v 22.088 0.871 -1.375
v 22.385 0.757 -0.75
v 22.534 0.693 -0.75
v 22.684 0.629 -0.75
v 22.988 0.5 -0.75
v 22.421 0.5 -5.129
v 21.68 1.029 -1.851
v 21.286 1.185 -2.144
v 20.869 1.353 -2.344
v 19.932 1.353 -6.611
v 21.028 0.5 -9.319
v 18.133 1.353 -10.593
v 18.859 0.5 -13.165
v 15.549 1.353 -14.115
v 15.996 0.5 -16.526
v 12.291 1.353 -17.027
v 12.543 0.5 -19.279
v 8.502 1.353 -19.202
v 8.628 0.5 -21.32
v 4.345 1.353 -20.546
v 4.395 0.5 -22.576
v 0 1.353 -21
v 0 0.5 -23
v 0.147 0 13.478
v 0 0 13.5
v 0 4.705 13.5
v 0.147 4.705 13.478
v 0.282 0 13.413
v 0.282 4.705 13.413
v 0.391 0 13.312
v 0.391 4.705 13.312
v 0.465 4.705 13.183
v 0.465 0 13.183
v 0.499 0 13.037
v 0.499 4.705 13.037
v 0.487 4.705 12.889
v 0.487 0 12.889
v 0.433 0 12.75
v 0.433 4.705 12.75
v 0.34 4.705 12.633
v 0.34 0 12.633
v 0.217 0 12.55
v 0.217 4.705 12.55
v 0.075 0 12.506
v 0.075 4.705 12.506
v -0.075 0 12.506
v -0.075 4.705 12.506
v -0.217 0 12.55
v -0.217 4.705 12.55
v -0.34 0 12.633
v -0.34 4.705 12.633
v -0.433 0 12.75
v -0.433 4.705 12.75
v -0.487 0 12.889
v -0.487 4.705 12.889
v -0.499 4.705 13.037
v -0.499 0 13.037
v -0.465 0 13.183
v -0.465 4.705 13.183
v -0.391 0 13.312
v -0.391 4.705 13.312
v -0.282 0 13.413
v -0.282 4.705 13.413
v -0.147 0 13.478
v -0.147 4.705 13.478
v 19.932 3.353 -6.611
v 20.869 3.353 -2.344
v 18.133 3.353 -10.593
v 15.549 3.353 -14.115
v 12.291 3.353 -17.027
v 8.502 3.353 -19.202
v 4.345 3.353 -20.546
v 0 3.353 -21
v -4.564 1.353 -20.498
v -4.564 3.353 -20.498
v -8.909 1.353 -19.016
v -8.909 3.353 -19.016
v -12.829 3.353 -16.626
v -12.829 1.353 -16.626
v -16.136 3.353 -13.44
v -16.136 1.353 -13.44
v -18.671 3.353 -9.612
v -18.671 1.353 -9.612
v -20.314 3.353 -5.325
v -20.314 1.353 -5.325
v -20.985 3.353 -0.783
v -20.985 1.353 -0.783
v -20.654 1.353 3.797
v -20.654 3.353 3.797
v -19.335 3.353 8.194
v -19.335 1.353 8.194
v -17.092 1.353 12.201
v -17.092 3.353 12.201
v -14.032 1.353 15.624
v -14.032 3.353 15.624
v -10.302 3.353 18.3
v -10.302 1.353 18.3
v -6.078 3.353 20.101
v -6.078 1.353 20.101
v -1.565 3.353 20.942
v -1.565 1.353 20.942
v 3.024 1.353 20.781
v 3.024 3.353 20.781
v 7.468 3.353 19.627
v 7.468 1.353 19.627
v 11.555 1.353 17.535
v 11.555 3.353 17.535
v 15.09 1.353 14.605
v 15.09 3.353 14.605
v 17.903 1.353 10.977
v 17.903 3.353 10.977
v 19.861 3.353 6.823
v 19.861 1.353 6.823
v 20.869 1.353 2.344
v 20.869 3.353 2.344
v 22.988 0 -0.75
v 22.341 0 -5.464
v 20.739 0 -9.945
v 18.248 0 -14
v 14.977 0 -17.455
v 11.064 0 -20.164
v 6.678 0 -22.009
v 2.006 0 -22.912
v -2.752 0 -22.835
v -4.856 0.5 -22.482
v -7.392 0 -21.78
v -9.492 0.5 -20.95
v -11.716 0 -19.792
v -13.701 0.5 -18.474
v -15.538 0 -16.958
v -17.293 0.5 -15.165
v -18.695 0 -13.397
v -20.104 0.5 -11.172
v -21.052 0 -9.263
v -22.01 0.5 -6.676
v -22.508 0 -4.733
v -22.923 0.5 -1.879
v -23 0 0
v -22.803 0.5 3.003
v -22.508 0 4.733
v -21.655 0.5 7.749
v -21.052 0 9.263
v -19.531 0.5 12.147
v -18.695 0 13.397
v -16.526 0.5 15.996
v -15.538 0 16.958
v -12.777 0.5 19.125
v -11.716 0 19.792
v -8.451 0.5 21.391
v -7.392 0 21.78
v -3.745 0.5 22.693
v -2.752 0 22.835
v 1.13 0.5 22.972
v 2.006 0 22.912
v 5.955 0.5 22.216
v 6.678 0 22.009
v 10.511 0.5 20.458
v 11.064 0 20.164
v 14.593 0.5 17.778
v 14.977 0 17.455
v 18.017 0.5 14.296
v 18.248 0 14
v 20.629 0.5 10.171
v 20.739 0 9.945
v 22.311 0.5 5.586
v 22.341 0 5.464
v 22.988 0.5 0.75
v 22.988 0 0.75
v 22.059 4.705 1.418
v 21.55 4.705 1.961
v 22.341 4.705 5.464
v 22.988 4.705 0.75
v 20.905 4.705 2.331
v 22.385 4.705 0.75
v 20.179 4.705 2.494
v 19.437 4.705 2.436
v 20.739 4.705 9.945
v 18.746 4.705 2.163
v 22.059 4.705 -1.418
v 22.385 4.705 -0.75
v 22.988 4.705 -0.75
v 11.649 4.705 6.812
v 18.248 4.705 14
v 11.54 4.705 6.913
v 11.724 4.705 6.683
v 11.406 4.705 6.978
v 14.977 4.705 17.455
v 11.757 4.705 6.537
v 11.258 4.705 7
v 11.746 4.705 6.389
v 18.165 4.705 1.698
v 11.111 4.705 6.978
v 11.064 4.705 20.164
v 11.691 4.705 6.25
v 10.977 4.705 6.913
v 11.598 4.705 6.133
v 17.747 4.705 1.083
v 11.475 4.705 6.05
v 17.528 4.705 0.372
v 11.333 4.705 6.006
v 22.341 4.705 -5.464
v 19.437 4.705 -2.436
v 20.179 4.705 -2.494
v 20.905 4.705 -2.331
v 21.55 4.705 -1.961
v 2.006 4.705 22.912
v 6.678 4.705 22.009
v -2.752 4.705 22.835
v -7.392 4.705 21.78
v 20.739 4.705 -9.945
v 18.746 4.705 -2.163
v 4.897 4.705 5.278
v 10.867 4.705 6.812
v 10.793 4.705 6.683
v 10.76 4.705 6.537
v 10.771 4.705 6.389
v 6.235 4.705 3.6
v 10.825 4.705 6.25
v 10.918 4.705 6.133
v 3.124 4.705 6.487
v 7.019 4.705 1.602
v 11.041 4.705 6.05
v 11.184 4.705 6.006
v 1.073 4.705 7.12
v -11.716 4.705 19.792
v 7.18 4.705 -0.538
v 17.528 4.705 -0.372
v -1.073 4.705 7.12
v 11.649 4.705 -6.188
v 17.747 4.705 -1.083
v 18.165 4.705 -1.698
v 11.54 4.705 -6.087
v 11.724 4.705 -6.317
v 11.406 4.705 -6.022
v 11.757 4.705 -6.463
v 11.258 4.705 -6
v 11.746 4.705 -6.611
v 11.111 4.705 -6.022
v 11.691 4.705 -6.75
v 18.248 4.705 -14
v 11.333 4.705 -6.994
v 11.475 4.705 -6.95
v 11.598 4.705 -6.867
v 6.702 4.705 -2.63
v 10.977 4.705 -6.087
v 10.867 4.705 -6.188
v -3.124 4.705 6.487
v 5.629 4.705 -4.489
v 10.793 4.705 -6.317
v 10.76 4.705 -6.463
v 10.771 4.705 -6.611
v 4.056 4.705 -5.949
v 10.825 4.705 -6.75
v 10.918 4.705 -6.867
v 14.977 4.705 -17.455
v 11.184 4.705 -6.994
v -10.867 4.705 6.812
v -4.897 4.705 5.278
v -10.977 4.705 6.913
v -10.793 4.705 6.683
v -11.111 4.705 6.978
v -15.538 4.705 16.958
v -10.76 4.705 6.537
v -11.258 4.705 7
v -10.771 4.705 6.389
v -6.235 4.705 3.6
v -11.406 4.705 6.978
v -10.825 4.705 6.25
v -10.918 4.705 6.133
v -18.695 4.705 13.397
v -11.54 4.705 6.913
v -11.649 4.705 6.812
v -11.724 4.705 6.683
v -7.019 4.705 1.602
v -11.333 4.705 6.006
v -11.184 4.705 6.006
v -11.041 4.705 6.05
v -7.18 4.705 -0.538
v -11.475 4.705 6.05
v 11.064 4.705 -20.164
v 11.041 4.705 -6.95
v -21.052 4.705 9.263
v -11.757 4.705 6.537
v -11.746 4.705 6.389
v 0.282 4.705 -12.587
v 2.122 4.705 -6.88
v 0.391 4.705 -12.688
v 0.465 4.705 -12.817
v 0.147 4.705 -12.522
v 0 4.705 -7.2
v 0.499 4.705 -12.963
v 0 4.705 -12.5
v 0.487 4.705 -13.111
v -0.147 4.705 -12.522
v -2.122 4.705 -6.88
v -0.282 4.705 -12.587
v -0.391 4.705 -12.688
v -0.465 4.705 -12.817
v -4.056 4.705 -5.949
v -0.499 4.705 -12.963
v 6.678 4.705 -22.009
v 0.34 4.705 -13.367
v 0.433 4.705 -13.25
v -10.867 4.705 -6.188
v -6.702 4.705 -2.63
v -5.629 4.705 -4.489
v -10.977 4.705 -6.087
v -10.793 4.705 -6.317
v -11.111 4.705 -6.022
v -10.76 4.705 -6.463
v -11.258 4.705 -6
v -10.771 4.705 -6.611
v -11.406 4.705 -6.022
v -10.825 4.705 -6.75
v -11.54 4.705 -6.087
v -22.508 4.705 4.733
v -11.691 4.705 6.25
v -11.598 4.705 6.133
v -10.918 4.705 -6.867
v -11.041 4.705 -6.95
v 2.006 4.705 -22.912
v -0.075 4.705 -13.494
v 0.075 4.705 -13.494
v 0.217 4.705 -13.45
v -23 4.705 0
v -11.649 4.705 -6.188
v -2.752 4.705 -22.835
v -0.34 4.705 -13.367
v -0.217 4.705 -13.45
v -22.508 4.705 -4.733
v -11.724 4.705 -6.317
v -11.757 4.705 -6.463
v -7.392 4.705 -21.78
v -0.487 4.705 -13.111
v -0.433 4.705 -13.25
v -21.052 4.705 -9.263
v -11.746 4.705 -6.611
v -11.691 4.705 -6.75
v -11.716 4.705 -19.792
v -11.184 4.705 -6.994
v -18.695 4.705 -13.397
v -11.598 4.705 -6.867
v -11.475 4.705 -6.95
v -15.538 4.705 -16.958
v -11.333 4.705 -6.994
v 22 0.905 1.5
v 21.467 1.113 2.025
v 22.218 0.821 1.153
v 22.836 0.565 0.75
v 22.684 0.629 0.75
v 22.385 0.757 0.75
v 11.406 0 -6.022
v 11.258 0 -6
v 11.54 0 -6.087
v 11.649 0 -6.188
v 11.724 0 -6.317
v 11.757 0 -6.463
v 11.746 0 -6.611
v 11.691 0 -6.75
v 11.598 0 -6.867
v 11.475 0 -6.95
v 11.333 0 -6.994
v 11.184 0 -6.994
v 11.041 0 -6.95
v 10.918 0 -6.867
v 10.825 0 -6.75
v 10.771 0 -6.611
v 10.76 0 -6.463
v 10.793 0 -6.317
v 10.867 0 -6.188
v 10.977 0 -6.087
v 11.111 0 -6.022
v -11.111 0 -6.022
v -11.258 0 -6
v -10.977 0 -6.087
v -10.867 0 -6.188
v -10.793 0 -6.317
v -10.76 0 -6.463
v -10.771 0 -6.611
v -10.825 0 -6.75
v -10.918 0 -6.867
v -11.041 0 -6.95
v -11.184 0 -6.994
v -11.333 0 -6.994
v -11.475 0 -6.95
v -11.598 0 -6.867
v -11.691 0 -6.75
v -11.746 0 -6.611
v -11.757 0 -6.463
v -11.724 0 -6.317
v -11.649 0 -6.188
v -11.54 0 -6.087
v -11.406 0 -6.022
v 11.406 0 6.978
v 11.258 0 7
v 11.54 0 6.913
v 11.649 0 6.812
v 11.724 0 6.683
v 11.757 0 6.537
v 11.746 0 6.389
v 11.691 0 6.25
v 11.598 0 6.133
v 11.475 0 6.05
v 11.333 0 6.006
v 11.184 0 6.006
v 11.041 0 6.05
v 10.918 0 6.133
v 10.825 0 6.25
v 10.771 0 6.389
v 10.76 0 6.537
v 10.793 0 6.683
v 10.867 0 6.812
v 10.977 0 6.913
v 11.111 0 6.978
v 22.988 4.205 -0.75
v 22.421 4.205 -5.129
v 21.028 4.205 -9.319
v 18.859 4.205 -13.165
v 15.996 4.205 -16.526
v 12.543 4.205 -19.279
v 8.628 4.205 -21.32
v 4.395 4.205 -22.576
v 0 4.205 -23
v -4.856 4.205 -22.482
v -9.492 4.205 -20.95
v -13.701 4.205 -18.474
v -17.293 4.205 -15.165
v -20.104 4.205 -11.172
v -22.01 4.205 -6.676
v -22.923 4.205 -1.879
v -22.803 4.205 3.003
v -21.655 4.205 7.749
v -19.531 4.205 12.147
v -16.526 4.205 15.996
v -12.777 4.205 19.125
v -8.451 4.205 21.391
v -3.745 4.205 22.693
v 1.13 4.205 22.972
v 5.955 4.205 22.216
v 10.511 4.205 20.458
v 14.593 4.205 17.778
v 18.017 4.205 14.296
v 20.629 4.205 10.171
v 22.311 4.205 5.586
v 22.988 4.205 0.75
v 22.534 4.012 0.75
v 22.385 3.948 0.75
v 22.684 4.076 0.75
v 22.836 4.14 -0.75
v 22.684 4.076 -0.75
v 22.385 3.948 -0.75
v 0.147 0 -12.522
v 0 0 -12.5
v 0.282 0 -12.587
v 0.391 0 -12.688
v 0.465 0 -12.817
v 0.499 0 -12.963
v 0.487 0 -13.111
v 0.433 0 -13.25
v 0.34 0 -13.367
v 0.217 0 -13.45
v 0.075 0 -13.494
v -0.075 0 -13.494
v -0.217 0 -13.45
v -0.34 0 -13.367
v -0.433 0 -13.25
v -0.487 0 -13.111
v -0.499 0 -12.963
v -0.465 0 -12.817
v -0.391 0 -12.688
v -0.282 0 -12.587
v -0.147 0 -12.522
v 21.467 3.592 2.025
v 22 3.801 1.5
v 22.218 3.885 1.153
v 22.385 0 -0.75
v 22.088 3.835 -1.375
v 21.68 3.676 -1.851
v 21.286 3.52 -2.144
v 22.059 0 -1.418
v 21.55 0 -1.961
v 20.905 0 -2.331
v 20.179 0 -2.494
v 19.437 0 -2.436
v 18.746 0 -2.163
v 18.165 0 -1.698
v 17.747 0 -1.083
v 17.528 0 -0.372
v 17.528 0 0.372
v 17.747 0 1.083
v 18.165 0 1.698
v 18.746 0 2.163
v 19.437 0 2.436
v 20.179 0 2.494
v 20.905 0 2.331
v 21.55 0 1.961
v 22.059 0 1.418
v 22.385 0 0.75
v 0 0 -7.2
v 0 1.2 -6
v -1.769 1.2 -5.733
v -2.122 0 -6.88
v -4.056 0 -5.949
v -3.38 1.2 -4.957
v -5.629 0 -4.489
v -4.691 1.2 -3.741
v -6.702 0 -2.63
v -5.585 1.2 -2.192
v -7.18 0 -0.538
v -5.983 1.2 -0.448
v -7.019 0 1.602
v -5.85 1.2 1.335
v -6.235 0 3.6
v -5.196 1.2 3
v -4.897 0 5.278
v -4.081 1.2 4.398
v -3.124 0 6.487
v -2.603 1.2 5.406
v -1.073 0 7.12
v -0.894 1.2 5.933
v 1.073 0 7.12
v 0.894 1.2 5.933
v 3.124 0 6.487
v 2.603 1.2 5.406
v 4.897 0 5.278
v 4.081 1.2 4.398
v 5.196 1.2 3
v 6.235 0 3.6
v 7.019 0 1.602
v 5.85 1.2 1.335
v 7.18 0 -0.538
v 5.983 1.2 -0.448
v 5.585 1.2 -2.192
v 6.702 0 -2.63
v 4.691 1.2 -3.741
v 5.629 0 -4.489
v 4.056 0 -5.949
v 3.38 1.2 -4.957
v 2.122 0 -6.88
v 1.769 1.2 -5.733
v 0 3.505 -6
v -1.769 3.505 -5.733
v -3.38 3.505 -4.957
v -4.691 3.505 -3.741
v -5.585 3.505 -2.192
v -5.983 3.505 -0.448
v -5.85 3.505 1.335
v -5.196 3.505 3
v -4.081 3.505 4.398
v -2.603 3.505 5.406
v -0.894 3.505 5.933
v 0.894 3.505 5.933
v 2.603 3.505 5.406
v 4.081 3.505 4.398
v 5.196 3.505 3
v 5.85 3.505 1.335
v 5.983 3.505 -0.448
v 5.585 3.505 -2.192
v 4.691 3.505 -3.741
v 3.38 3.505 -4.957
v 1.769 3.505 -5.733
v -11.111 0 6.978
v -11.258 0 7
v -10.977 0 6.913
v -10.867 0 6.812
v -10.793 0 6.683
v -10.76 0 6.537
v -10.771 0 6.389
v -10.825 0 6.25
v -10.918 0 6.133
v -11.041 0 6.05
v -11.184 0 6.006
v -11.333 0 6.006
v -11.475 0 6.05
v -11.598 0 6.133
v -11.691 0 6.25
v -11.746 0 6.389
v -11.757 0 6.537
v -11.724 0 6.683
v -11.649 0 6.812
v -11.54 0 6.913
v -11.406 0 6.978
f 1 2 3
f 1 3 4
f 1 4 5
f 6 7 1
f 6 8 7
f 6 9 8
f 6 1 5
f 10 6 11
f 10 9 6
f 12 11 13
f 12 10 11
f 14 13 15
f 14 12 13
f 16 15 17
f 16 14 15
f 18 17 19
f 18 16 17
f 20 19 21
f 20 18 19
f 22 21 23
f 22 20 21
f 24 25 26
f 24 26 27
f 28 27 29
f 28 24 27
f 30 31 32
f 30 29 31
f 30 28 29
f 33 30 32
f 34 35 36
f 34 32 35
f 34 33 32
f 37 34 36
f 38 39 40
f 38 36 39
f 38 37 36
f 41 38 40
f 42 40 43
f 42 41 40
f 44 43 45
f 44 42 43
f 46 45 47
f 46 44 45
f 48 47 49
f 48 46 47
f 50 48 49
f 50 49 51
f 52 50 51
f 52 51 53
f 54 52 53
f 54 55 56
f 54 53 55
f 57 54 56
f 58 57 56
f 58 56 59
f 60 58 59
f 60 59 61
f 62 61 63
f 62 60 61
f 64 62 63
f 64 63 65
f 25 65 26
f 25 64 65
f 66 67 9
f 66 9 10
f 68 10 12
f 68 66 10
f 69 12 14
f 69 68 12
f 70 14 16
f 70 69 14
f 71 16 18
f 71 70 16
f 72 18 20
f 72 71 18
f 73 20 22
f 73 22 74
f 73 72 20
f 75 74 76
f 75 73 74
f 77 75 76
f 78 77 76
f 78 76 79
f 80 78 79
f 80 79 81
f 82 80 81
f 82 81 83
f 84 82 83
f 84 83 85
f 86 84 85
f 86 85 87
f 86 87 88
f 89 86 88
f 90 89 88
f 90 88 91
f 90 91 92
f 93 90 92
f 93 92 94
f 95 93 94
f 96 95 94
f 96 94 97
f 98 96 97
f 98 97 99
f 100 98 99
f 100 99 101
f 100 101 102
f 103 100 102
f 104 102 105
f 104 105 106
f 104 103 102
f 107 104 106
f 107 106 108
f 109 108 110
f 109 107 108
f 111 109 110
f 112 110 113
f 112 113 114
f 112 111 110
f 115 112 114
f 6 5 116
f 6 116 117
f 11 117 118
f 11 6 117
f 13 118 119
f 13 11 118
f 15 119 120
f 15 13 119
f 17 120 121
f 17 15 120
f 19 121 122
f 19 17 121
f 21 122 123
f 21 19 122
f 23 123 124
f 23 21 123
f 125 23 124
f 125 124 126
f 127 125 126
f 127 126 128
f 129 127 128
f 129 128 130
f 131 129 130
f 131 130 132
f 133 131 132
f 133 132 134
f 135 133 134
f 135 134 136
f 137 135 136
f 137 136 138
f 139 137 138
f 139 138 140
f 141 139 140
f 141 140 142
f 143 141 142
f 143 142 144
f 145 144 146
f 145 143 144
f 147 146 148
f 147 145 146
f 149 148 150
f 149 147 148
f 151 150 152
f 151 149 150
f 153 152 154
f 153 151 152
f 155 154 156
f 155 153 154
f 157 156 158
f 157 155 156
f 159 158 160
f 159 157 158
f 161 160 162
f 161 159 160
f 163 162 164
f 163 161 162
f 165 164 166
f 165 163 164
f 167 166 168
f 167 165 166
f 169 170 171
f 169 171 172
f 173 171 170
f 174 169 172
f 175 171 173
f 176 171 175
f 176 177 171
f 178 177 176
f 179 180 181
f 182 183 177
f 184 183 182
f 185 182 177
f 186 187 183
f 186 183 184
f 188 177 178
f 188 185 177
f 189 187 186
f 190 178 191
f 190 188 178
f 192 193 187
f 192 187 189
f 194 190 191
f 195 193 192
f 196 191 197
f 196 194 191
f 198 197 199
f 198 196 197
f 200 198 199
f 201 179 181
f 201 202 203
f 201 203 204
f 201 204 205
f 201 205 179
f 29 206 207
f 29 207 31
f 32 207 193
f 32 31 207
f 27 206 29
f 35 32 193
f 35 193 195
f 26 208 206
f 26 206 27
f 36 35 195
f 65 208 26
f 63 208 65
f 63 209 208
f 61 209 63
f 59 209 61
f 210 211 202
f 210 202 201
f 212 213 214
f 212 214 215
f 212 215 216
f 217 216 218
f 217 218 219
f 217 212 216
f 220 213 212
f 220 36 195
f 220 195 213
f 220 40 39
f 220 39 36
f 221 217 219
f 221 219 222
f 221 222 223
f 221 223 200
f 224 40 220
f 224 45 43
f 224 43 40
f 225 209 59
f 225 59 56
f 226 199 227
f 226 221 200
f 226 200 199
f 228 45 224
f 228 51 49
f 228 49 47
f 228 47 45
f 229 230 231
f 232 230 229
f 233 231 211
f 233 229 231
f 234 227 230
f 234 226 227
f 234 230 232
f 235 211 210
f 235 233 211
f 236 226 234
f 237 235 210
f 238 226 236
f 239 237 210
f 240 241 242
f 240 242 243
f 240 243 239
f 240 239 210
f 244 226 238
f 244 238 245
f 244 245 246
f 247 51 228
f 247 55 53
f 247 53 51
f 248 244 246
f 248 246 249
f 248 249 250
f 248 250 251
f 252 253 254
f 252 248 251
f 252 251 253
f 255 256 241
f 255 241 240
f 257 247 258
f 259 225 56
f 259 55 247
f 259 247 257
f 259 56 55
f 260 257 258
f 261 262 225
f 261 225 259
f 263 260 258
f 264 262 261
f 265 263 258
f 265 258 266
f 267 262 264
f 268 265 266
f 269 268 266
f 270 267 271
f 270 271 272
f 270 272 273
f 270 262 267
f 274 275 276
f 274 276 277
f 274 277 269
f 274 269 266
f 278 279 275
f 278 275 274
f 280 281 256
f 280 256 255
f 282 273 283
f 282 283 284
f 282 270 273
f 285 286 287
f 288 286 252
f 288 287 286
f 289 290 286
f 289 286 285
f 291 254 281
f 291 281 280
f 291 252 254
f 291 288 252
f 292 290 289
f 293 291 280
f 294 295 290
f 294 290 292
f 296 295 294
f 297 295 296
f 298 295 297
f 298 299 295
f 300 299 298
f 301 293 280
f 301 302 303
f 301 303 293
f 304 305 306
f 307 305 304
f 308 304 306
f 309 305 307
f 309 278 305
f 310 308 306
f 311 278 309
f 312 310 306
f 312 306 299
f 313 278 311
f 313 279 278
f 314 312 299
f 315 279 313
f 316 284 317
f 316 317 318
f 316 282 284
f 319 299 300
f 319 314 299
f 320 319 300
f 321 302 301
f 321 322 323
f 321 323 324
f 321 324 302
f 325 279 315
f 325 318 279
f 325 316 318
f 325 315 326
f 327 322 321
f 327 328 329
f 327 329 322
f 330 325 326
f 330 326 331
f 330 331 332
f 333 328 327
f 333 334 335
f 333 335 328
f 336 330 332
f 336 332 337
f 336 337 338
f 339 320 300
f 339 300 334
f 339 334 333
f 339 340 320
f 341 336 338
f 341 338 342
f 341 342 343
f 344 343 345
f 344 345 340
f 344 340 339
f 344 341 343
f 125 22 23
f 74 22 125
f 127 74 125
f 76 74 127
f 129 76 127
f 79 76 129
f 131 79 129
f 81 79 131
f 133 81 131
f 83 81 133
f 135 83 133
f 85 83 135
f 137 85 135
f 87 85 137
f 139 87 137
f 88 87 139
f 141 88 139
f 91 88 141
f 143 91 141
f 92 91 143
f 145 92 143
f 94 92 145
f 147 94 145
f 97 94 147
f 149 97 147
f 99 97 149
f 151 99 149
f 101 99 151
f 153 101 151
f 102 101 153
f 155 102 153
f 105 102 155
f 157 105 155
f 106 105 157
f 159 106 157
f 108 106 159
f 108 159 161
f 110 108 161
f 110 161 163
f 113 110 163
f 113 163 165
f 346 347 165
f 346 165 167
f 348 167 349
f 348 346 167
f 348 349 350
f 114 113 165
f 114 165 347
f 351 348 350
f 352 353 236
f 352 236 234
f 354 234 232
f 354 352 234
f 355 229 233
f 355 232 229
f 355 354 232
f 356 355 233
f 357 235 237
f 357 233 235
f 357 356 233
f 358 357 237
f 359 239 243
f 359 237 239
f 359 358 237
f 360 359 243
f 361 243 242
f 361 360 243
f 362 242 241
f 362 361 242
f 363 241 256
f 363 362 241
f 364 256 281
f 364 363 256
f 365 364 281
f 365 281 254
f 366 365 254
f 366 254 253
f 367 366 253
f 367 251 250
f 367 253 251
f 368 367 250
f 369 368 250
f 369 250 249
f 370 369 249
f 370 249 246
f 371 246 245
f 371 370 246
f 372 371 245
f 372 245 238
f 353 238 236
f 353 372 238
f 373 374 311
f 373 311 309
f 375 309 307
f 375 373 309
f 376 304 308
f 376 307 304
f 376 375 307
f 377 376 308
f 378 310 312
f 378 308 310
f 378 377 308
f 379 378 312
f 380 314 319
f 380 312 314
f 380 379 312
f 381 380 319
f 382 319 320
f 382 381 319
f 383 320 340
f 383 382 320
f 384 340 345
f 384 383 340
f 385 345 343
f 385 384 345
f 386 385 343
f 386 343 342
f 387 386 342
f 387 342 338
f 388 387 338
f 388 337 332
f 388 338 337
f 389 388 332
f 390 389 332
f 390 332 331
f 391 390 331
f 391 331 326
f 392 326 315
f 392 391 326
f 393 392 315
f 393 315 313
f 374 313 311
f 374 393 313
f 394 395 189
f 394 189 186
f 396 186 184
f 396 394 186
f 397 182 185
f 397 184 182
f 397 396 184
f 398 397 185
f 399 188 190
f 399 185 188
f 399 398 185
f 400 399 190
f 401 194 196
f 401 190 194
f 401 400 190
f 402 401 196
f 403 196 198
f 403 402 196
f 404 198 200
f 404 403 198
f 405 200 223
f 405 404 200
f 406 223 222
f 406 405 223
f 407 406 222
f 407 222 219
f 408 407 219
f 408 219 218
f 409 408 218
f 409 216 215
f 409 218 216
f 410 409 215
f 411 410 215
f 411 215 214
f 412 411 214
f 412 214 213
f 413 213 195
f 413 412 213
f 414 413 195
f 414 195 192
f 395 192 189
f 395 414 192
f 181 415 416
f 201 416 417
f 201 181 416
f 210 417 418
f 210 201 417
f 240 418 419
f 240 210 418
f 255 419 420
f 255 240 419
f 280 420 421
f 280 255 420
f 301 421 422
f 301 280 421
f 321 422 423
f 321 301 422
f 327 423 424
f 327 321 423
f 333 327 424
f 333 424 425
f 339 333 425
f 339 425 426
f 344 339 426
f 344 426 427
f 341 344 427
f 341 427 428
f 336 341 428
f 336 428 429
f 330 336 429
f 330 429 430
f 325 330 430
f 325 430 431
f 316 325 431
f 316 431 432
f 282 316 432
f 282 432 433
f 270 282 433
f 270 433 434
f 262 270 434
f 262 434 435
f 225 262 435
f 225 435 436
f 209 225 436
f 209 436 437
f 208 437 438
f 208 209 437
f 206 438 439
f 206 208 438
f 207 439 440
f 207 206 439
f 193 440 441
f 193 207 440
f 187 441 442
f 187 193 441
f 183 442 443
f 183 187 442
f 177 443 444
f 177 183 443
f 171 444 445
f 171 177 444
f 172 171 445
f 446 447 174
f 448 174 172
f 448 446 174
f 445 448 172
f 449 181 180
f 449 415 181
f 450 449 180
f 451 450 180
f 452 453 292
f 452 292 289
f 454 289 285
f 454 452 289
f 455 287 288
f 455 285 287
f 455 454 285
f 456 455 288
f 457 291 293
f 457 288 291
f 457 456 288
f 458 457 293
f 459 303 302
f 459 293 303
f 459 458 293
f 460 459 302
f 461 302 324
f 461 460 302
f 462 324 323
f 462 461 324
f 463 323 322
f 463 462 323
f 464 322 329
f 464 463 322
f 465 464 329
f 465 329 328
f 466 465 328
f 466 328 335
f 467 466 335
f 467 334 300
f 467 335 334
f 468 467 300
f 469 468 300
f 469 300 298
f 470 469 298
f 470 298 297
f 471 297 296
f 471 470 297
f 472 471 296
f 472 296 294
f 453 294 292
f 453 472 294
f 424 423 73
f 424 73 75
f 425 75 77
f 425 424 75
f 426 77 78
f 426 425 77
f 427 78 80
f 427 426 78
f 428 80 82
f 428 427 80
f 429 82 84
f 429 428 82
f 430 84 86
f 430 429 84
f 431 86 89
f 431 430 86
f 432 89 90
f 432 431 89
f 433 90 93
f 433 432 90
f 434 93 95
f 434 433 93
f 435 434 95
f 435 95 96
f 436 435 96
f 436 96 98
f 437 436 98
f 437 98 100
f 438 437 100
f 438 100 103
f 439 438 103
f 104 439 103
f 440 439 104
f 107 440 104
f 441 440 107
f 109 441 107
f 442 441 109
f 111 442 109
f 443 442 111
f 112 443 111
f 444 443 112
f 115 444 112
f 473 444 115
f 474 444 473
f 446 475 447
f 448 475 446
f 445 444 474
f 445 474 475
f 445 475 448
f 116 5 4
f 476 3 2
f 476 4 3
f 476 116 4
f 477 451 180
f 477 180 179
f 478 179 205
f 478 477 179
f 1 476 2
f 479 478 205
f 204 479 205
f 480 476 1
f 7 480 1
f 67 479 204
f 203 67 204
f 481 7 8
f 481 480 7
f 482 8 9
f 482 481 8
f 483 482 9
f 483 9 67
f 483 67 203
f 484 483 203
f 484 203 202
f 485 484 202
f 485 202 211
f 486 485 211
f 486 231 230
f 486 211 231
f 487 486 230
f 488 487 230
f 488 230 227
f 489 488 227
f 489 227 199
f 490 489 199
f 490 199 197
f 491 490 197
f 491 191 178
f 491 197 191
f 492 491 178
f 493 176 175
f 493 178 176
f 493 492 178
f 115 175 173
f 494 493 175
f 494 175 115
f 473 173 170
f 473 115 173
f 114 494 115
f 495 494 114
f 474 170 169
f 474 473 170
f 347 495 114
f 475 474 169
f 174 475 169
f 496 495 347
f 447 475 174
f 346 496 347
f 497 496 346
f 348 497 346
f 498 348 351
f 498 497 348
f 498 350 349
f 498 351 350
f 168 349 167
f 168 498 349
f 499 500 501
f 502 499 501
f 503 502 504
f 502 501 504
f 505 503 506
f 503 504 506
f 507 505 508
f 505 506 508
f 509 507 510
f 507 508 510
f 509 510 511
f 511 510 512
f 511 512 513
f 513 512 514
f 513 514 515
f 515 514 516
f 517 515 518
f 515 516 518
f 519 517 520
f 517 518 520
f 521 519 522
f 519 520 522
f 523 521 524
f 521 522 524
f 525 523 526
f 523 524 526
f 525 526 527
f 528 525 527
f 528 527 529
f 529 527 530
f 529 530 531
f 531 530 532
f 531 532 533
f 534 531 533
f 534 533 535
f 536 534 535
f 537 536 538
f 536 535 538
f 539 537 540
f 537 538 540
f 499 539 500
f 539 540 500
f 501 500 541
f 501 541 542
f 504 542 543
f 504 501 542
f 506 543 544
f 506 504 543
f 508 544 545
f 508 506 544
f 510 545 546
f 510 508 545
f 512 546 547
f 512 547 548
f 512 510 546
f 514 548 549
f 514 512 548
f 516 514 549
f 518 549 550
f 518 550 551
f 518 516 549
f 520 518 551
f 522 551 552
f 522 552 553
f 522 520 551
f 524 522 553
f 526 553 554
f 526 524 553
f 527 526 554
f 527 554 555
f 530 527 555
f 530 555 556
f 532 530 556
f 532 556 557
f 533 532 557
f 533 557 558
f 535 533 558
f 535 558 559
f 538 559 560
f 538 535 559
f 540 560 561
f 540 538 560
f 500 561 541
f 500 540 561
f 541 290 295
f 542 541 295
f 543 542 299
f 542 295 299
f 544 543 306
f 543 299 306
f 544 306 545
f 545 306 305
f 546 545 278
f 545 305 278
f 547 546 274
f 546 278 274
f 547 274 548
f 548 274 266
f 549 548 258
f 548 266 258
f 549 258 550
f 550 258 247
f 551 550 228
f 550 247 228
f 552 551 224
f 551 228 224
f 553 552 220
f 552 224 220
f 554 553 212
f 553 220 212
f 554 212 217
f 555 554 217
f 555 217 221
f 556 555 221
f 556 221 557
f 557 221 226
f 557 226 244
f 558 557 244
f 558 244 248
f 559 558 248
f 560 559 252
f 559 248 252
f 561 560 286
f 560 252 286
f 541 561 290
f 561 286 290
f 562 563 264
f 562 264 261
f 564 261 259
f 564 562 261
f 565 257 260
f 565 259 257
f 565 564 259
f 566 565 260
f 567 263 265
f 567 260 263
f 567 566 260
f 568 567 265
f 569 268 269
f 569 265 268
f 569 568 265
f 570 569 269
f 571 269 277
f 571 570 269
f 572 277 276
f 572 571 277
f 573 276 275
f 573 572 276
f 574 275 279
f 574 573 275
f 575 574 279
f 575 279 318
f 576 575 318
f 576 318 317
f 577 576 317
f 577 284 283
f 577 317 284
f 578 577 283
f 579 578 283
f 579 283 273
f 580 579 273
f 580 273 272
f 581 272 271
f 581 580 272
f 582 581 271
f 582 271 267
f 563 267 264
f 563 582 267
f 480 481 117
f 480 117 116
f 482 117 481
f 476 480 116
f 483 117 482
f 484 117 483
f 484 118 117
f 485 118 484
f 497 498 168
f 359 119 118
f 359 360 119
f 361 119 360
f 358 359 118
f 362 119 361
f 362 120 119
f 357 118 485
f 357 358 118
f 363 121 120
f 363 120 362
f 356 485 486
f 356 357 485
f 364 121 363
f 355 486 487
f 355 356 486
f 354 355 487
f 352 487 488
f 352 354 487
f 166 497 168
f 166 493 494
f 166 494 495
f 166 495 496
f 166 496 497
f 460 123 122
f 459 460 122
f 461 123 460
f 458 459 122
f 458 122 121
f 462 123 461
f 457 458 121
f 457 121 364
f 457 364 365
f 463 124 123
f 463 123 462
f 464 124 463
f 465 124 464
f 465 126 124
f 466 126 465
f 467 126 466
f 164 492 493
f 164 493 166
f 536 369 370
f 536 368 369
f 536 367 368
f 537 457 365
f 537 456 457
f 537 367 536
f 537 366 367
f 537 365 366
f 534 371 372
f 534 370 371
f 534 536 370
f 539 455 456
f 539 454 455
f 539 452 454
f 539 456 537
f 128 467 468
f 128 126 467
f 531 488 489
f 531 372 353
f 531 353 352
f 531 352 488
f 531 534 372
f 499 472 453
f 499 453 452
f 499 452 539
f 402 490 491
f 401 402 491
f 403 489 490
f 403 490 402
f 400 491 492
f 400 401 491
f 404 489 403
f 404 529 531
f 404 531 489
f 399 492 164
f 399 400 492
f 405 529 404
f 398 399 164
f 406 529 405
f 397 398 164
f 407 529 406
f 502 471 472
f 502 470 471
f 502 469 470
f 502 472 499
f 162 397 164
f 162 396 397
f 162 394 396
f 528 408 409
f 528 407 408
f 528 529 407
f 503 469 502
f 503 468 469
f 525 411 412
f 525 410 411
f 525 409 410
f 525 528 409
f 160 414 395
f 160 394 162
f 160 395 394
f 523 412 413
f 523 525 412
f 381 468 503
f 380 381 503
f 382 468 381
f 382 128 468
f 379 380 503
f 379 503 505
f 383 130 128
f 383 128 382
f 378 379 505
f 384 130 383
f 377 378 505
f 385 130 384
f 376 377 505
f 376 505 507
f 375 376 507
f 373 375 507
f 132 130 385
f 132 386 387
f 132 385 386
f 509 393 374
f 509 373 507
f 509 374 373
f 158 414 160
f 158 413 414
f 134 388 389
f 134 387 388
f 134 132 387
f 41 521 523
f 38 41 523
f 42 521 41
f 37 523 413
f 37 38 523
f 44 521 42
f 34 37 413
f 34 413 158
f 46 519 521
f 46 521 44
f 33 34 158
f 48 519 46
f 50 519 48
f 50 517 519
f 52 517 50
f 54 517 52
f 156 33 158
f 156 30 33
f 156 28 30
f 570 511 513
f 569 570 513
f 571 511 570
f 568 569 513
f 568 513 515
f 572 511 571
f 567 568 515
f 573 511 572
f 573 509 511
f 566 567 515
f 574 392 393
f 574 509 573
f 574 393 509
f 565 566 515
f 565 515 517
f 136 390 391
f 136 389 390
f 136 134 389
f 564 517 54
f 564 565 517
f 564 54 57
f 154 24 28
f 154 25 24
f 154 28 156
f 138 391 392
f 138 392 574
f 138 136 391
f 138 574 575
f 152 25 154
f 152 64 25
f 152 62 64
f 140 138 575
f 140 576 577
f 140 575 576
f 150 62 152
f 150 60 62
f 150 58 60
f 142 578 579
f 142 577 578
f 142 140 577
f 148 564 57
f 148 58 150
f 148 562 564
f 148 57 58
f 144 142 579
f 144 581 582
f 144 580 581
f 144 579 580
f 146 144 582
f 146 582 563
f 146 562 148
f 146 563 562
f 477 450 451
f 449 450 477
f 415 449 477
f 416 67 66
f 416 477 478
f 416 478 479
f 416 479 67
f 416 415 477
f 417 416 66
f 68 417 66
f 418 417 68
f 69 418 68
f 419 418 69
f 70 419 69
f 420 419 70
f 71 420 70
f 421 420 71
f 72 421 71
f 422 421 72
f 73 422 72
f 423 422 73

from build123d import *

# Parameters (mm, degrees)
CORTE_EXTRUS_O1_DEPTH      = 10
CHANFRO3_SIZE              = 1.2
CORTE_EXTRUS_O2_DEPTH      = 33.865482391
CORTE_EXTRUS_O2_DEPTH_BACK = 33.865482391
ESBO_O5_R                  = 0.5


with BuildPart() as part:
    # Esboço2 → Revolução1 (revolve)
    with BuildSketch(Plane.XY, mode=Mode.PRIVATE) as revolu_o1_sk:
        Polygon((6, 0), (23, 0), (23, 0.5), (21, 1.352653961), (21, 3.352653961), (23, 4.205307923), (23, 4.705307923), (6, 4.705307923), align=None)
    revolve(revolu_o1_sk.sketch.rotate(Axis((0, 0, 0), (0, 1, 0)), 90), axis=Axis((0, 0, 0), (0, 1, 0)))

    # Esboço3 → Corte-extrusão1 (cut)
    with BuildSketch(Plane.XZ):
        with BuildLine():
            Line((23.115047023, 0.75), (23.115047023, -0.75))
            Line((23.115047023, -0.75), (22.384848004, -0.75))
            ThreePointArc((22.384848004, -0.75), (17.5, 0), (22.384848004, 0.75))
            Line((22.384848004, 0.75), (23.115047023, 0.75))
        make_face()
    extrude(amount=-CORTE_EXTRUS_O1_DEPTH, mode=Mode.SUBTRACT)

    # Chanfro3
    chanfro3_edges = [part.edges().sort_by_distance(p)[0] for p in [
        (0, 0, 6),
        (0, 4.705307923, 6),
    ]]
    chamfer(chanfro3_edges, length=CHANFRO3_SIZE)

    # Esboço5 → Corte-extrusão2 (cut, two sides: drawn at the far end of the back side and taken through both)
    with BuildSketch(Plane(origin=(0, 4.705307923, 0), x_dir=(1, 0, 0), z_dir=(0, 1, 0)).offset(-CORTE_EXTRUS_O2_DEPTH_BACK)):
        with Locations(Location((0, 13, 0), (0, 0, 270))):
            Circle(ESBO_O5_R)
        with Locations(Location((0, -13, 0), (0, 0, 270))):
            Circle(ESBO_O5_R)
        with Locations(Location((11.258330249, 6.5, 0), (0, 0, 270))):
            Circle(ESBO_O5_R)
        with Locations(Location((-11.258330249, -6.5, 0), (0, 0, 270))):
            Circle(ESBO_O5_R)
        with Locations(Location((11.258330249, -6.5, 0), (0, 0, 270))):
            Circle(ESBO_O5_R)
        with Locations(Location((-11.258330249, 6.5, 0), (0, 0, 270))):
            Circle(ESBO_O5_R)
    extrude(amount=CORTE_EXTRUS_O2_DEPTH + CORTE_EXTRUS_O2_DEPTH_BACK, mode=Mode.SUBTRACT)


solid = part.part
